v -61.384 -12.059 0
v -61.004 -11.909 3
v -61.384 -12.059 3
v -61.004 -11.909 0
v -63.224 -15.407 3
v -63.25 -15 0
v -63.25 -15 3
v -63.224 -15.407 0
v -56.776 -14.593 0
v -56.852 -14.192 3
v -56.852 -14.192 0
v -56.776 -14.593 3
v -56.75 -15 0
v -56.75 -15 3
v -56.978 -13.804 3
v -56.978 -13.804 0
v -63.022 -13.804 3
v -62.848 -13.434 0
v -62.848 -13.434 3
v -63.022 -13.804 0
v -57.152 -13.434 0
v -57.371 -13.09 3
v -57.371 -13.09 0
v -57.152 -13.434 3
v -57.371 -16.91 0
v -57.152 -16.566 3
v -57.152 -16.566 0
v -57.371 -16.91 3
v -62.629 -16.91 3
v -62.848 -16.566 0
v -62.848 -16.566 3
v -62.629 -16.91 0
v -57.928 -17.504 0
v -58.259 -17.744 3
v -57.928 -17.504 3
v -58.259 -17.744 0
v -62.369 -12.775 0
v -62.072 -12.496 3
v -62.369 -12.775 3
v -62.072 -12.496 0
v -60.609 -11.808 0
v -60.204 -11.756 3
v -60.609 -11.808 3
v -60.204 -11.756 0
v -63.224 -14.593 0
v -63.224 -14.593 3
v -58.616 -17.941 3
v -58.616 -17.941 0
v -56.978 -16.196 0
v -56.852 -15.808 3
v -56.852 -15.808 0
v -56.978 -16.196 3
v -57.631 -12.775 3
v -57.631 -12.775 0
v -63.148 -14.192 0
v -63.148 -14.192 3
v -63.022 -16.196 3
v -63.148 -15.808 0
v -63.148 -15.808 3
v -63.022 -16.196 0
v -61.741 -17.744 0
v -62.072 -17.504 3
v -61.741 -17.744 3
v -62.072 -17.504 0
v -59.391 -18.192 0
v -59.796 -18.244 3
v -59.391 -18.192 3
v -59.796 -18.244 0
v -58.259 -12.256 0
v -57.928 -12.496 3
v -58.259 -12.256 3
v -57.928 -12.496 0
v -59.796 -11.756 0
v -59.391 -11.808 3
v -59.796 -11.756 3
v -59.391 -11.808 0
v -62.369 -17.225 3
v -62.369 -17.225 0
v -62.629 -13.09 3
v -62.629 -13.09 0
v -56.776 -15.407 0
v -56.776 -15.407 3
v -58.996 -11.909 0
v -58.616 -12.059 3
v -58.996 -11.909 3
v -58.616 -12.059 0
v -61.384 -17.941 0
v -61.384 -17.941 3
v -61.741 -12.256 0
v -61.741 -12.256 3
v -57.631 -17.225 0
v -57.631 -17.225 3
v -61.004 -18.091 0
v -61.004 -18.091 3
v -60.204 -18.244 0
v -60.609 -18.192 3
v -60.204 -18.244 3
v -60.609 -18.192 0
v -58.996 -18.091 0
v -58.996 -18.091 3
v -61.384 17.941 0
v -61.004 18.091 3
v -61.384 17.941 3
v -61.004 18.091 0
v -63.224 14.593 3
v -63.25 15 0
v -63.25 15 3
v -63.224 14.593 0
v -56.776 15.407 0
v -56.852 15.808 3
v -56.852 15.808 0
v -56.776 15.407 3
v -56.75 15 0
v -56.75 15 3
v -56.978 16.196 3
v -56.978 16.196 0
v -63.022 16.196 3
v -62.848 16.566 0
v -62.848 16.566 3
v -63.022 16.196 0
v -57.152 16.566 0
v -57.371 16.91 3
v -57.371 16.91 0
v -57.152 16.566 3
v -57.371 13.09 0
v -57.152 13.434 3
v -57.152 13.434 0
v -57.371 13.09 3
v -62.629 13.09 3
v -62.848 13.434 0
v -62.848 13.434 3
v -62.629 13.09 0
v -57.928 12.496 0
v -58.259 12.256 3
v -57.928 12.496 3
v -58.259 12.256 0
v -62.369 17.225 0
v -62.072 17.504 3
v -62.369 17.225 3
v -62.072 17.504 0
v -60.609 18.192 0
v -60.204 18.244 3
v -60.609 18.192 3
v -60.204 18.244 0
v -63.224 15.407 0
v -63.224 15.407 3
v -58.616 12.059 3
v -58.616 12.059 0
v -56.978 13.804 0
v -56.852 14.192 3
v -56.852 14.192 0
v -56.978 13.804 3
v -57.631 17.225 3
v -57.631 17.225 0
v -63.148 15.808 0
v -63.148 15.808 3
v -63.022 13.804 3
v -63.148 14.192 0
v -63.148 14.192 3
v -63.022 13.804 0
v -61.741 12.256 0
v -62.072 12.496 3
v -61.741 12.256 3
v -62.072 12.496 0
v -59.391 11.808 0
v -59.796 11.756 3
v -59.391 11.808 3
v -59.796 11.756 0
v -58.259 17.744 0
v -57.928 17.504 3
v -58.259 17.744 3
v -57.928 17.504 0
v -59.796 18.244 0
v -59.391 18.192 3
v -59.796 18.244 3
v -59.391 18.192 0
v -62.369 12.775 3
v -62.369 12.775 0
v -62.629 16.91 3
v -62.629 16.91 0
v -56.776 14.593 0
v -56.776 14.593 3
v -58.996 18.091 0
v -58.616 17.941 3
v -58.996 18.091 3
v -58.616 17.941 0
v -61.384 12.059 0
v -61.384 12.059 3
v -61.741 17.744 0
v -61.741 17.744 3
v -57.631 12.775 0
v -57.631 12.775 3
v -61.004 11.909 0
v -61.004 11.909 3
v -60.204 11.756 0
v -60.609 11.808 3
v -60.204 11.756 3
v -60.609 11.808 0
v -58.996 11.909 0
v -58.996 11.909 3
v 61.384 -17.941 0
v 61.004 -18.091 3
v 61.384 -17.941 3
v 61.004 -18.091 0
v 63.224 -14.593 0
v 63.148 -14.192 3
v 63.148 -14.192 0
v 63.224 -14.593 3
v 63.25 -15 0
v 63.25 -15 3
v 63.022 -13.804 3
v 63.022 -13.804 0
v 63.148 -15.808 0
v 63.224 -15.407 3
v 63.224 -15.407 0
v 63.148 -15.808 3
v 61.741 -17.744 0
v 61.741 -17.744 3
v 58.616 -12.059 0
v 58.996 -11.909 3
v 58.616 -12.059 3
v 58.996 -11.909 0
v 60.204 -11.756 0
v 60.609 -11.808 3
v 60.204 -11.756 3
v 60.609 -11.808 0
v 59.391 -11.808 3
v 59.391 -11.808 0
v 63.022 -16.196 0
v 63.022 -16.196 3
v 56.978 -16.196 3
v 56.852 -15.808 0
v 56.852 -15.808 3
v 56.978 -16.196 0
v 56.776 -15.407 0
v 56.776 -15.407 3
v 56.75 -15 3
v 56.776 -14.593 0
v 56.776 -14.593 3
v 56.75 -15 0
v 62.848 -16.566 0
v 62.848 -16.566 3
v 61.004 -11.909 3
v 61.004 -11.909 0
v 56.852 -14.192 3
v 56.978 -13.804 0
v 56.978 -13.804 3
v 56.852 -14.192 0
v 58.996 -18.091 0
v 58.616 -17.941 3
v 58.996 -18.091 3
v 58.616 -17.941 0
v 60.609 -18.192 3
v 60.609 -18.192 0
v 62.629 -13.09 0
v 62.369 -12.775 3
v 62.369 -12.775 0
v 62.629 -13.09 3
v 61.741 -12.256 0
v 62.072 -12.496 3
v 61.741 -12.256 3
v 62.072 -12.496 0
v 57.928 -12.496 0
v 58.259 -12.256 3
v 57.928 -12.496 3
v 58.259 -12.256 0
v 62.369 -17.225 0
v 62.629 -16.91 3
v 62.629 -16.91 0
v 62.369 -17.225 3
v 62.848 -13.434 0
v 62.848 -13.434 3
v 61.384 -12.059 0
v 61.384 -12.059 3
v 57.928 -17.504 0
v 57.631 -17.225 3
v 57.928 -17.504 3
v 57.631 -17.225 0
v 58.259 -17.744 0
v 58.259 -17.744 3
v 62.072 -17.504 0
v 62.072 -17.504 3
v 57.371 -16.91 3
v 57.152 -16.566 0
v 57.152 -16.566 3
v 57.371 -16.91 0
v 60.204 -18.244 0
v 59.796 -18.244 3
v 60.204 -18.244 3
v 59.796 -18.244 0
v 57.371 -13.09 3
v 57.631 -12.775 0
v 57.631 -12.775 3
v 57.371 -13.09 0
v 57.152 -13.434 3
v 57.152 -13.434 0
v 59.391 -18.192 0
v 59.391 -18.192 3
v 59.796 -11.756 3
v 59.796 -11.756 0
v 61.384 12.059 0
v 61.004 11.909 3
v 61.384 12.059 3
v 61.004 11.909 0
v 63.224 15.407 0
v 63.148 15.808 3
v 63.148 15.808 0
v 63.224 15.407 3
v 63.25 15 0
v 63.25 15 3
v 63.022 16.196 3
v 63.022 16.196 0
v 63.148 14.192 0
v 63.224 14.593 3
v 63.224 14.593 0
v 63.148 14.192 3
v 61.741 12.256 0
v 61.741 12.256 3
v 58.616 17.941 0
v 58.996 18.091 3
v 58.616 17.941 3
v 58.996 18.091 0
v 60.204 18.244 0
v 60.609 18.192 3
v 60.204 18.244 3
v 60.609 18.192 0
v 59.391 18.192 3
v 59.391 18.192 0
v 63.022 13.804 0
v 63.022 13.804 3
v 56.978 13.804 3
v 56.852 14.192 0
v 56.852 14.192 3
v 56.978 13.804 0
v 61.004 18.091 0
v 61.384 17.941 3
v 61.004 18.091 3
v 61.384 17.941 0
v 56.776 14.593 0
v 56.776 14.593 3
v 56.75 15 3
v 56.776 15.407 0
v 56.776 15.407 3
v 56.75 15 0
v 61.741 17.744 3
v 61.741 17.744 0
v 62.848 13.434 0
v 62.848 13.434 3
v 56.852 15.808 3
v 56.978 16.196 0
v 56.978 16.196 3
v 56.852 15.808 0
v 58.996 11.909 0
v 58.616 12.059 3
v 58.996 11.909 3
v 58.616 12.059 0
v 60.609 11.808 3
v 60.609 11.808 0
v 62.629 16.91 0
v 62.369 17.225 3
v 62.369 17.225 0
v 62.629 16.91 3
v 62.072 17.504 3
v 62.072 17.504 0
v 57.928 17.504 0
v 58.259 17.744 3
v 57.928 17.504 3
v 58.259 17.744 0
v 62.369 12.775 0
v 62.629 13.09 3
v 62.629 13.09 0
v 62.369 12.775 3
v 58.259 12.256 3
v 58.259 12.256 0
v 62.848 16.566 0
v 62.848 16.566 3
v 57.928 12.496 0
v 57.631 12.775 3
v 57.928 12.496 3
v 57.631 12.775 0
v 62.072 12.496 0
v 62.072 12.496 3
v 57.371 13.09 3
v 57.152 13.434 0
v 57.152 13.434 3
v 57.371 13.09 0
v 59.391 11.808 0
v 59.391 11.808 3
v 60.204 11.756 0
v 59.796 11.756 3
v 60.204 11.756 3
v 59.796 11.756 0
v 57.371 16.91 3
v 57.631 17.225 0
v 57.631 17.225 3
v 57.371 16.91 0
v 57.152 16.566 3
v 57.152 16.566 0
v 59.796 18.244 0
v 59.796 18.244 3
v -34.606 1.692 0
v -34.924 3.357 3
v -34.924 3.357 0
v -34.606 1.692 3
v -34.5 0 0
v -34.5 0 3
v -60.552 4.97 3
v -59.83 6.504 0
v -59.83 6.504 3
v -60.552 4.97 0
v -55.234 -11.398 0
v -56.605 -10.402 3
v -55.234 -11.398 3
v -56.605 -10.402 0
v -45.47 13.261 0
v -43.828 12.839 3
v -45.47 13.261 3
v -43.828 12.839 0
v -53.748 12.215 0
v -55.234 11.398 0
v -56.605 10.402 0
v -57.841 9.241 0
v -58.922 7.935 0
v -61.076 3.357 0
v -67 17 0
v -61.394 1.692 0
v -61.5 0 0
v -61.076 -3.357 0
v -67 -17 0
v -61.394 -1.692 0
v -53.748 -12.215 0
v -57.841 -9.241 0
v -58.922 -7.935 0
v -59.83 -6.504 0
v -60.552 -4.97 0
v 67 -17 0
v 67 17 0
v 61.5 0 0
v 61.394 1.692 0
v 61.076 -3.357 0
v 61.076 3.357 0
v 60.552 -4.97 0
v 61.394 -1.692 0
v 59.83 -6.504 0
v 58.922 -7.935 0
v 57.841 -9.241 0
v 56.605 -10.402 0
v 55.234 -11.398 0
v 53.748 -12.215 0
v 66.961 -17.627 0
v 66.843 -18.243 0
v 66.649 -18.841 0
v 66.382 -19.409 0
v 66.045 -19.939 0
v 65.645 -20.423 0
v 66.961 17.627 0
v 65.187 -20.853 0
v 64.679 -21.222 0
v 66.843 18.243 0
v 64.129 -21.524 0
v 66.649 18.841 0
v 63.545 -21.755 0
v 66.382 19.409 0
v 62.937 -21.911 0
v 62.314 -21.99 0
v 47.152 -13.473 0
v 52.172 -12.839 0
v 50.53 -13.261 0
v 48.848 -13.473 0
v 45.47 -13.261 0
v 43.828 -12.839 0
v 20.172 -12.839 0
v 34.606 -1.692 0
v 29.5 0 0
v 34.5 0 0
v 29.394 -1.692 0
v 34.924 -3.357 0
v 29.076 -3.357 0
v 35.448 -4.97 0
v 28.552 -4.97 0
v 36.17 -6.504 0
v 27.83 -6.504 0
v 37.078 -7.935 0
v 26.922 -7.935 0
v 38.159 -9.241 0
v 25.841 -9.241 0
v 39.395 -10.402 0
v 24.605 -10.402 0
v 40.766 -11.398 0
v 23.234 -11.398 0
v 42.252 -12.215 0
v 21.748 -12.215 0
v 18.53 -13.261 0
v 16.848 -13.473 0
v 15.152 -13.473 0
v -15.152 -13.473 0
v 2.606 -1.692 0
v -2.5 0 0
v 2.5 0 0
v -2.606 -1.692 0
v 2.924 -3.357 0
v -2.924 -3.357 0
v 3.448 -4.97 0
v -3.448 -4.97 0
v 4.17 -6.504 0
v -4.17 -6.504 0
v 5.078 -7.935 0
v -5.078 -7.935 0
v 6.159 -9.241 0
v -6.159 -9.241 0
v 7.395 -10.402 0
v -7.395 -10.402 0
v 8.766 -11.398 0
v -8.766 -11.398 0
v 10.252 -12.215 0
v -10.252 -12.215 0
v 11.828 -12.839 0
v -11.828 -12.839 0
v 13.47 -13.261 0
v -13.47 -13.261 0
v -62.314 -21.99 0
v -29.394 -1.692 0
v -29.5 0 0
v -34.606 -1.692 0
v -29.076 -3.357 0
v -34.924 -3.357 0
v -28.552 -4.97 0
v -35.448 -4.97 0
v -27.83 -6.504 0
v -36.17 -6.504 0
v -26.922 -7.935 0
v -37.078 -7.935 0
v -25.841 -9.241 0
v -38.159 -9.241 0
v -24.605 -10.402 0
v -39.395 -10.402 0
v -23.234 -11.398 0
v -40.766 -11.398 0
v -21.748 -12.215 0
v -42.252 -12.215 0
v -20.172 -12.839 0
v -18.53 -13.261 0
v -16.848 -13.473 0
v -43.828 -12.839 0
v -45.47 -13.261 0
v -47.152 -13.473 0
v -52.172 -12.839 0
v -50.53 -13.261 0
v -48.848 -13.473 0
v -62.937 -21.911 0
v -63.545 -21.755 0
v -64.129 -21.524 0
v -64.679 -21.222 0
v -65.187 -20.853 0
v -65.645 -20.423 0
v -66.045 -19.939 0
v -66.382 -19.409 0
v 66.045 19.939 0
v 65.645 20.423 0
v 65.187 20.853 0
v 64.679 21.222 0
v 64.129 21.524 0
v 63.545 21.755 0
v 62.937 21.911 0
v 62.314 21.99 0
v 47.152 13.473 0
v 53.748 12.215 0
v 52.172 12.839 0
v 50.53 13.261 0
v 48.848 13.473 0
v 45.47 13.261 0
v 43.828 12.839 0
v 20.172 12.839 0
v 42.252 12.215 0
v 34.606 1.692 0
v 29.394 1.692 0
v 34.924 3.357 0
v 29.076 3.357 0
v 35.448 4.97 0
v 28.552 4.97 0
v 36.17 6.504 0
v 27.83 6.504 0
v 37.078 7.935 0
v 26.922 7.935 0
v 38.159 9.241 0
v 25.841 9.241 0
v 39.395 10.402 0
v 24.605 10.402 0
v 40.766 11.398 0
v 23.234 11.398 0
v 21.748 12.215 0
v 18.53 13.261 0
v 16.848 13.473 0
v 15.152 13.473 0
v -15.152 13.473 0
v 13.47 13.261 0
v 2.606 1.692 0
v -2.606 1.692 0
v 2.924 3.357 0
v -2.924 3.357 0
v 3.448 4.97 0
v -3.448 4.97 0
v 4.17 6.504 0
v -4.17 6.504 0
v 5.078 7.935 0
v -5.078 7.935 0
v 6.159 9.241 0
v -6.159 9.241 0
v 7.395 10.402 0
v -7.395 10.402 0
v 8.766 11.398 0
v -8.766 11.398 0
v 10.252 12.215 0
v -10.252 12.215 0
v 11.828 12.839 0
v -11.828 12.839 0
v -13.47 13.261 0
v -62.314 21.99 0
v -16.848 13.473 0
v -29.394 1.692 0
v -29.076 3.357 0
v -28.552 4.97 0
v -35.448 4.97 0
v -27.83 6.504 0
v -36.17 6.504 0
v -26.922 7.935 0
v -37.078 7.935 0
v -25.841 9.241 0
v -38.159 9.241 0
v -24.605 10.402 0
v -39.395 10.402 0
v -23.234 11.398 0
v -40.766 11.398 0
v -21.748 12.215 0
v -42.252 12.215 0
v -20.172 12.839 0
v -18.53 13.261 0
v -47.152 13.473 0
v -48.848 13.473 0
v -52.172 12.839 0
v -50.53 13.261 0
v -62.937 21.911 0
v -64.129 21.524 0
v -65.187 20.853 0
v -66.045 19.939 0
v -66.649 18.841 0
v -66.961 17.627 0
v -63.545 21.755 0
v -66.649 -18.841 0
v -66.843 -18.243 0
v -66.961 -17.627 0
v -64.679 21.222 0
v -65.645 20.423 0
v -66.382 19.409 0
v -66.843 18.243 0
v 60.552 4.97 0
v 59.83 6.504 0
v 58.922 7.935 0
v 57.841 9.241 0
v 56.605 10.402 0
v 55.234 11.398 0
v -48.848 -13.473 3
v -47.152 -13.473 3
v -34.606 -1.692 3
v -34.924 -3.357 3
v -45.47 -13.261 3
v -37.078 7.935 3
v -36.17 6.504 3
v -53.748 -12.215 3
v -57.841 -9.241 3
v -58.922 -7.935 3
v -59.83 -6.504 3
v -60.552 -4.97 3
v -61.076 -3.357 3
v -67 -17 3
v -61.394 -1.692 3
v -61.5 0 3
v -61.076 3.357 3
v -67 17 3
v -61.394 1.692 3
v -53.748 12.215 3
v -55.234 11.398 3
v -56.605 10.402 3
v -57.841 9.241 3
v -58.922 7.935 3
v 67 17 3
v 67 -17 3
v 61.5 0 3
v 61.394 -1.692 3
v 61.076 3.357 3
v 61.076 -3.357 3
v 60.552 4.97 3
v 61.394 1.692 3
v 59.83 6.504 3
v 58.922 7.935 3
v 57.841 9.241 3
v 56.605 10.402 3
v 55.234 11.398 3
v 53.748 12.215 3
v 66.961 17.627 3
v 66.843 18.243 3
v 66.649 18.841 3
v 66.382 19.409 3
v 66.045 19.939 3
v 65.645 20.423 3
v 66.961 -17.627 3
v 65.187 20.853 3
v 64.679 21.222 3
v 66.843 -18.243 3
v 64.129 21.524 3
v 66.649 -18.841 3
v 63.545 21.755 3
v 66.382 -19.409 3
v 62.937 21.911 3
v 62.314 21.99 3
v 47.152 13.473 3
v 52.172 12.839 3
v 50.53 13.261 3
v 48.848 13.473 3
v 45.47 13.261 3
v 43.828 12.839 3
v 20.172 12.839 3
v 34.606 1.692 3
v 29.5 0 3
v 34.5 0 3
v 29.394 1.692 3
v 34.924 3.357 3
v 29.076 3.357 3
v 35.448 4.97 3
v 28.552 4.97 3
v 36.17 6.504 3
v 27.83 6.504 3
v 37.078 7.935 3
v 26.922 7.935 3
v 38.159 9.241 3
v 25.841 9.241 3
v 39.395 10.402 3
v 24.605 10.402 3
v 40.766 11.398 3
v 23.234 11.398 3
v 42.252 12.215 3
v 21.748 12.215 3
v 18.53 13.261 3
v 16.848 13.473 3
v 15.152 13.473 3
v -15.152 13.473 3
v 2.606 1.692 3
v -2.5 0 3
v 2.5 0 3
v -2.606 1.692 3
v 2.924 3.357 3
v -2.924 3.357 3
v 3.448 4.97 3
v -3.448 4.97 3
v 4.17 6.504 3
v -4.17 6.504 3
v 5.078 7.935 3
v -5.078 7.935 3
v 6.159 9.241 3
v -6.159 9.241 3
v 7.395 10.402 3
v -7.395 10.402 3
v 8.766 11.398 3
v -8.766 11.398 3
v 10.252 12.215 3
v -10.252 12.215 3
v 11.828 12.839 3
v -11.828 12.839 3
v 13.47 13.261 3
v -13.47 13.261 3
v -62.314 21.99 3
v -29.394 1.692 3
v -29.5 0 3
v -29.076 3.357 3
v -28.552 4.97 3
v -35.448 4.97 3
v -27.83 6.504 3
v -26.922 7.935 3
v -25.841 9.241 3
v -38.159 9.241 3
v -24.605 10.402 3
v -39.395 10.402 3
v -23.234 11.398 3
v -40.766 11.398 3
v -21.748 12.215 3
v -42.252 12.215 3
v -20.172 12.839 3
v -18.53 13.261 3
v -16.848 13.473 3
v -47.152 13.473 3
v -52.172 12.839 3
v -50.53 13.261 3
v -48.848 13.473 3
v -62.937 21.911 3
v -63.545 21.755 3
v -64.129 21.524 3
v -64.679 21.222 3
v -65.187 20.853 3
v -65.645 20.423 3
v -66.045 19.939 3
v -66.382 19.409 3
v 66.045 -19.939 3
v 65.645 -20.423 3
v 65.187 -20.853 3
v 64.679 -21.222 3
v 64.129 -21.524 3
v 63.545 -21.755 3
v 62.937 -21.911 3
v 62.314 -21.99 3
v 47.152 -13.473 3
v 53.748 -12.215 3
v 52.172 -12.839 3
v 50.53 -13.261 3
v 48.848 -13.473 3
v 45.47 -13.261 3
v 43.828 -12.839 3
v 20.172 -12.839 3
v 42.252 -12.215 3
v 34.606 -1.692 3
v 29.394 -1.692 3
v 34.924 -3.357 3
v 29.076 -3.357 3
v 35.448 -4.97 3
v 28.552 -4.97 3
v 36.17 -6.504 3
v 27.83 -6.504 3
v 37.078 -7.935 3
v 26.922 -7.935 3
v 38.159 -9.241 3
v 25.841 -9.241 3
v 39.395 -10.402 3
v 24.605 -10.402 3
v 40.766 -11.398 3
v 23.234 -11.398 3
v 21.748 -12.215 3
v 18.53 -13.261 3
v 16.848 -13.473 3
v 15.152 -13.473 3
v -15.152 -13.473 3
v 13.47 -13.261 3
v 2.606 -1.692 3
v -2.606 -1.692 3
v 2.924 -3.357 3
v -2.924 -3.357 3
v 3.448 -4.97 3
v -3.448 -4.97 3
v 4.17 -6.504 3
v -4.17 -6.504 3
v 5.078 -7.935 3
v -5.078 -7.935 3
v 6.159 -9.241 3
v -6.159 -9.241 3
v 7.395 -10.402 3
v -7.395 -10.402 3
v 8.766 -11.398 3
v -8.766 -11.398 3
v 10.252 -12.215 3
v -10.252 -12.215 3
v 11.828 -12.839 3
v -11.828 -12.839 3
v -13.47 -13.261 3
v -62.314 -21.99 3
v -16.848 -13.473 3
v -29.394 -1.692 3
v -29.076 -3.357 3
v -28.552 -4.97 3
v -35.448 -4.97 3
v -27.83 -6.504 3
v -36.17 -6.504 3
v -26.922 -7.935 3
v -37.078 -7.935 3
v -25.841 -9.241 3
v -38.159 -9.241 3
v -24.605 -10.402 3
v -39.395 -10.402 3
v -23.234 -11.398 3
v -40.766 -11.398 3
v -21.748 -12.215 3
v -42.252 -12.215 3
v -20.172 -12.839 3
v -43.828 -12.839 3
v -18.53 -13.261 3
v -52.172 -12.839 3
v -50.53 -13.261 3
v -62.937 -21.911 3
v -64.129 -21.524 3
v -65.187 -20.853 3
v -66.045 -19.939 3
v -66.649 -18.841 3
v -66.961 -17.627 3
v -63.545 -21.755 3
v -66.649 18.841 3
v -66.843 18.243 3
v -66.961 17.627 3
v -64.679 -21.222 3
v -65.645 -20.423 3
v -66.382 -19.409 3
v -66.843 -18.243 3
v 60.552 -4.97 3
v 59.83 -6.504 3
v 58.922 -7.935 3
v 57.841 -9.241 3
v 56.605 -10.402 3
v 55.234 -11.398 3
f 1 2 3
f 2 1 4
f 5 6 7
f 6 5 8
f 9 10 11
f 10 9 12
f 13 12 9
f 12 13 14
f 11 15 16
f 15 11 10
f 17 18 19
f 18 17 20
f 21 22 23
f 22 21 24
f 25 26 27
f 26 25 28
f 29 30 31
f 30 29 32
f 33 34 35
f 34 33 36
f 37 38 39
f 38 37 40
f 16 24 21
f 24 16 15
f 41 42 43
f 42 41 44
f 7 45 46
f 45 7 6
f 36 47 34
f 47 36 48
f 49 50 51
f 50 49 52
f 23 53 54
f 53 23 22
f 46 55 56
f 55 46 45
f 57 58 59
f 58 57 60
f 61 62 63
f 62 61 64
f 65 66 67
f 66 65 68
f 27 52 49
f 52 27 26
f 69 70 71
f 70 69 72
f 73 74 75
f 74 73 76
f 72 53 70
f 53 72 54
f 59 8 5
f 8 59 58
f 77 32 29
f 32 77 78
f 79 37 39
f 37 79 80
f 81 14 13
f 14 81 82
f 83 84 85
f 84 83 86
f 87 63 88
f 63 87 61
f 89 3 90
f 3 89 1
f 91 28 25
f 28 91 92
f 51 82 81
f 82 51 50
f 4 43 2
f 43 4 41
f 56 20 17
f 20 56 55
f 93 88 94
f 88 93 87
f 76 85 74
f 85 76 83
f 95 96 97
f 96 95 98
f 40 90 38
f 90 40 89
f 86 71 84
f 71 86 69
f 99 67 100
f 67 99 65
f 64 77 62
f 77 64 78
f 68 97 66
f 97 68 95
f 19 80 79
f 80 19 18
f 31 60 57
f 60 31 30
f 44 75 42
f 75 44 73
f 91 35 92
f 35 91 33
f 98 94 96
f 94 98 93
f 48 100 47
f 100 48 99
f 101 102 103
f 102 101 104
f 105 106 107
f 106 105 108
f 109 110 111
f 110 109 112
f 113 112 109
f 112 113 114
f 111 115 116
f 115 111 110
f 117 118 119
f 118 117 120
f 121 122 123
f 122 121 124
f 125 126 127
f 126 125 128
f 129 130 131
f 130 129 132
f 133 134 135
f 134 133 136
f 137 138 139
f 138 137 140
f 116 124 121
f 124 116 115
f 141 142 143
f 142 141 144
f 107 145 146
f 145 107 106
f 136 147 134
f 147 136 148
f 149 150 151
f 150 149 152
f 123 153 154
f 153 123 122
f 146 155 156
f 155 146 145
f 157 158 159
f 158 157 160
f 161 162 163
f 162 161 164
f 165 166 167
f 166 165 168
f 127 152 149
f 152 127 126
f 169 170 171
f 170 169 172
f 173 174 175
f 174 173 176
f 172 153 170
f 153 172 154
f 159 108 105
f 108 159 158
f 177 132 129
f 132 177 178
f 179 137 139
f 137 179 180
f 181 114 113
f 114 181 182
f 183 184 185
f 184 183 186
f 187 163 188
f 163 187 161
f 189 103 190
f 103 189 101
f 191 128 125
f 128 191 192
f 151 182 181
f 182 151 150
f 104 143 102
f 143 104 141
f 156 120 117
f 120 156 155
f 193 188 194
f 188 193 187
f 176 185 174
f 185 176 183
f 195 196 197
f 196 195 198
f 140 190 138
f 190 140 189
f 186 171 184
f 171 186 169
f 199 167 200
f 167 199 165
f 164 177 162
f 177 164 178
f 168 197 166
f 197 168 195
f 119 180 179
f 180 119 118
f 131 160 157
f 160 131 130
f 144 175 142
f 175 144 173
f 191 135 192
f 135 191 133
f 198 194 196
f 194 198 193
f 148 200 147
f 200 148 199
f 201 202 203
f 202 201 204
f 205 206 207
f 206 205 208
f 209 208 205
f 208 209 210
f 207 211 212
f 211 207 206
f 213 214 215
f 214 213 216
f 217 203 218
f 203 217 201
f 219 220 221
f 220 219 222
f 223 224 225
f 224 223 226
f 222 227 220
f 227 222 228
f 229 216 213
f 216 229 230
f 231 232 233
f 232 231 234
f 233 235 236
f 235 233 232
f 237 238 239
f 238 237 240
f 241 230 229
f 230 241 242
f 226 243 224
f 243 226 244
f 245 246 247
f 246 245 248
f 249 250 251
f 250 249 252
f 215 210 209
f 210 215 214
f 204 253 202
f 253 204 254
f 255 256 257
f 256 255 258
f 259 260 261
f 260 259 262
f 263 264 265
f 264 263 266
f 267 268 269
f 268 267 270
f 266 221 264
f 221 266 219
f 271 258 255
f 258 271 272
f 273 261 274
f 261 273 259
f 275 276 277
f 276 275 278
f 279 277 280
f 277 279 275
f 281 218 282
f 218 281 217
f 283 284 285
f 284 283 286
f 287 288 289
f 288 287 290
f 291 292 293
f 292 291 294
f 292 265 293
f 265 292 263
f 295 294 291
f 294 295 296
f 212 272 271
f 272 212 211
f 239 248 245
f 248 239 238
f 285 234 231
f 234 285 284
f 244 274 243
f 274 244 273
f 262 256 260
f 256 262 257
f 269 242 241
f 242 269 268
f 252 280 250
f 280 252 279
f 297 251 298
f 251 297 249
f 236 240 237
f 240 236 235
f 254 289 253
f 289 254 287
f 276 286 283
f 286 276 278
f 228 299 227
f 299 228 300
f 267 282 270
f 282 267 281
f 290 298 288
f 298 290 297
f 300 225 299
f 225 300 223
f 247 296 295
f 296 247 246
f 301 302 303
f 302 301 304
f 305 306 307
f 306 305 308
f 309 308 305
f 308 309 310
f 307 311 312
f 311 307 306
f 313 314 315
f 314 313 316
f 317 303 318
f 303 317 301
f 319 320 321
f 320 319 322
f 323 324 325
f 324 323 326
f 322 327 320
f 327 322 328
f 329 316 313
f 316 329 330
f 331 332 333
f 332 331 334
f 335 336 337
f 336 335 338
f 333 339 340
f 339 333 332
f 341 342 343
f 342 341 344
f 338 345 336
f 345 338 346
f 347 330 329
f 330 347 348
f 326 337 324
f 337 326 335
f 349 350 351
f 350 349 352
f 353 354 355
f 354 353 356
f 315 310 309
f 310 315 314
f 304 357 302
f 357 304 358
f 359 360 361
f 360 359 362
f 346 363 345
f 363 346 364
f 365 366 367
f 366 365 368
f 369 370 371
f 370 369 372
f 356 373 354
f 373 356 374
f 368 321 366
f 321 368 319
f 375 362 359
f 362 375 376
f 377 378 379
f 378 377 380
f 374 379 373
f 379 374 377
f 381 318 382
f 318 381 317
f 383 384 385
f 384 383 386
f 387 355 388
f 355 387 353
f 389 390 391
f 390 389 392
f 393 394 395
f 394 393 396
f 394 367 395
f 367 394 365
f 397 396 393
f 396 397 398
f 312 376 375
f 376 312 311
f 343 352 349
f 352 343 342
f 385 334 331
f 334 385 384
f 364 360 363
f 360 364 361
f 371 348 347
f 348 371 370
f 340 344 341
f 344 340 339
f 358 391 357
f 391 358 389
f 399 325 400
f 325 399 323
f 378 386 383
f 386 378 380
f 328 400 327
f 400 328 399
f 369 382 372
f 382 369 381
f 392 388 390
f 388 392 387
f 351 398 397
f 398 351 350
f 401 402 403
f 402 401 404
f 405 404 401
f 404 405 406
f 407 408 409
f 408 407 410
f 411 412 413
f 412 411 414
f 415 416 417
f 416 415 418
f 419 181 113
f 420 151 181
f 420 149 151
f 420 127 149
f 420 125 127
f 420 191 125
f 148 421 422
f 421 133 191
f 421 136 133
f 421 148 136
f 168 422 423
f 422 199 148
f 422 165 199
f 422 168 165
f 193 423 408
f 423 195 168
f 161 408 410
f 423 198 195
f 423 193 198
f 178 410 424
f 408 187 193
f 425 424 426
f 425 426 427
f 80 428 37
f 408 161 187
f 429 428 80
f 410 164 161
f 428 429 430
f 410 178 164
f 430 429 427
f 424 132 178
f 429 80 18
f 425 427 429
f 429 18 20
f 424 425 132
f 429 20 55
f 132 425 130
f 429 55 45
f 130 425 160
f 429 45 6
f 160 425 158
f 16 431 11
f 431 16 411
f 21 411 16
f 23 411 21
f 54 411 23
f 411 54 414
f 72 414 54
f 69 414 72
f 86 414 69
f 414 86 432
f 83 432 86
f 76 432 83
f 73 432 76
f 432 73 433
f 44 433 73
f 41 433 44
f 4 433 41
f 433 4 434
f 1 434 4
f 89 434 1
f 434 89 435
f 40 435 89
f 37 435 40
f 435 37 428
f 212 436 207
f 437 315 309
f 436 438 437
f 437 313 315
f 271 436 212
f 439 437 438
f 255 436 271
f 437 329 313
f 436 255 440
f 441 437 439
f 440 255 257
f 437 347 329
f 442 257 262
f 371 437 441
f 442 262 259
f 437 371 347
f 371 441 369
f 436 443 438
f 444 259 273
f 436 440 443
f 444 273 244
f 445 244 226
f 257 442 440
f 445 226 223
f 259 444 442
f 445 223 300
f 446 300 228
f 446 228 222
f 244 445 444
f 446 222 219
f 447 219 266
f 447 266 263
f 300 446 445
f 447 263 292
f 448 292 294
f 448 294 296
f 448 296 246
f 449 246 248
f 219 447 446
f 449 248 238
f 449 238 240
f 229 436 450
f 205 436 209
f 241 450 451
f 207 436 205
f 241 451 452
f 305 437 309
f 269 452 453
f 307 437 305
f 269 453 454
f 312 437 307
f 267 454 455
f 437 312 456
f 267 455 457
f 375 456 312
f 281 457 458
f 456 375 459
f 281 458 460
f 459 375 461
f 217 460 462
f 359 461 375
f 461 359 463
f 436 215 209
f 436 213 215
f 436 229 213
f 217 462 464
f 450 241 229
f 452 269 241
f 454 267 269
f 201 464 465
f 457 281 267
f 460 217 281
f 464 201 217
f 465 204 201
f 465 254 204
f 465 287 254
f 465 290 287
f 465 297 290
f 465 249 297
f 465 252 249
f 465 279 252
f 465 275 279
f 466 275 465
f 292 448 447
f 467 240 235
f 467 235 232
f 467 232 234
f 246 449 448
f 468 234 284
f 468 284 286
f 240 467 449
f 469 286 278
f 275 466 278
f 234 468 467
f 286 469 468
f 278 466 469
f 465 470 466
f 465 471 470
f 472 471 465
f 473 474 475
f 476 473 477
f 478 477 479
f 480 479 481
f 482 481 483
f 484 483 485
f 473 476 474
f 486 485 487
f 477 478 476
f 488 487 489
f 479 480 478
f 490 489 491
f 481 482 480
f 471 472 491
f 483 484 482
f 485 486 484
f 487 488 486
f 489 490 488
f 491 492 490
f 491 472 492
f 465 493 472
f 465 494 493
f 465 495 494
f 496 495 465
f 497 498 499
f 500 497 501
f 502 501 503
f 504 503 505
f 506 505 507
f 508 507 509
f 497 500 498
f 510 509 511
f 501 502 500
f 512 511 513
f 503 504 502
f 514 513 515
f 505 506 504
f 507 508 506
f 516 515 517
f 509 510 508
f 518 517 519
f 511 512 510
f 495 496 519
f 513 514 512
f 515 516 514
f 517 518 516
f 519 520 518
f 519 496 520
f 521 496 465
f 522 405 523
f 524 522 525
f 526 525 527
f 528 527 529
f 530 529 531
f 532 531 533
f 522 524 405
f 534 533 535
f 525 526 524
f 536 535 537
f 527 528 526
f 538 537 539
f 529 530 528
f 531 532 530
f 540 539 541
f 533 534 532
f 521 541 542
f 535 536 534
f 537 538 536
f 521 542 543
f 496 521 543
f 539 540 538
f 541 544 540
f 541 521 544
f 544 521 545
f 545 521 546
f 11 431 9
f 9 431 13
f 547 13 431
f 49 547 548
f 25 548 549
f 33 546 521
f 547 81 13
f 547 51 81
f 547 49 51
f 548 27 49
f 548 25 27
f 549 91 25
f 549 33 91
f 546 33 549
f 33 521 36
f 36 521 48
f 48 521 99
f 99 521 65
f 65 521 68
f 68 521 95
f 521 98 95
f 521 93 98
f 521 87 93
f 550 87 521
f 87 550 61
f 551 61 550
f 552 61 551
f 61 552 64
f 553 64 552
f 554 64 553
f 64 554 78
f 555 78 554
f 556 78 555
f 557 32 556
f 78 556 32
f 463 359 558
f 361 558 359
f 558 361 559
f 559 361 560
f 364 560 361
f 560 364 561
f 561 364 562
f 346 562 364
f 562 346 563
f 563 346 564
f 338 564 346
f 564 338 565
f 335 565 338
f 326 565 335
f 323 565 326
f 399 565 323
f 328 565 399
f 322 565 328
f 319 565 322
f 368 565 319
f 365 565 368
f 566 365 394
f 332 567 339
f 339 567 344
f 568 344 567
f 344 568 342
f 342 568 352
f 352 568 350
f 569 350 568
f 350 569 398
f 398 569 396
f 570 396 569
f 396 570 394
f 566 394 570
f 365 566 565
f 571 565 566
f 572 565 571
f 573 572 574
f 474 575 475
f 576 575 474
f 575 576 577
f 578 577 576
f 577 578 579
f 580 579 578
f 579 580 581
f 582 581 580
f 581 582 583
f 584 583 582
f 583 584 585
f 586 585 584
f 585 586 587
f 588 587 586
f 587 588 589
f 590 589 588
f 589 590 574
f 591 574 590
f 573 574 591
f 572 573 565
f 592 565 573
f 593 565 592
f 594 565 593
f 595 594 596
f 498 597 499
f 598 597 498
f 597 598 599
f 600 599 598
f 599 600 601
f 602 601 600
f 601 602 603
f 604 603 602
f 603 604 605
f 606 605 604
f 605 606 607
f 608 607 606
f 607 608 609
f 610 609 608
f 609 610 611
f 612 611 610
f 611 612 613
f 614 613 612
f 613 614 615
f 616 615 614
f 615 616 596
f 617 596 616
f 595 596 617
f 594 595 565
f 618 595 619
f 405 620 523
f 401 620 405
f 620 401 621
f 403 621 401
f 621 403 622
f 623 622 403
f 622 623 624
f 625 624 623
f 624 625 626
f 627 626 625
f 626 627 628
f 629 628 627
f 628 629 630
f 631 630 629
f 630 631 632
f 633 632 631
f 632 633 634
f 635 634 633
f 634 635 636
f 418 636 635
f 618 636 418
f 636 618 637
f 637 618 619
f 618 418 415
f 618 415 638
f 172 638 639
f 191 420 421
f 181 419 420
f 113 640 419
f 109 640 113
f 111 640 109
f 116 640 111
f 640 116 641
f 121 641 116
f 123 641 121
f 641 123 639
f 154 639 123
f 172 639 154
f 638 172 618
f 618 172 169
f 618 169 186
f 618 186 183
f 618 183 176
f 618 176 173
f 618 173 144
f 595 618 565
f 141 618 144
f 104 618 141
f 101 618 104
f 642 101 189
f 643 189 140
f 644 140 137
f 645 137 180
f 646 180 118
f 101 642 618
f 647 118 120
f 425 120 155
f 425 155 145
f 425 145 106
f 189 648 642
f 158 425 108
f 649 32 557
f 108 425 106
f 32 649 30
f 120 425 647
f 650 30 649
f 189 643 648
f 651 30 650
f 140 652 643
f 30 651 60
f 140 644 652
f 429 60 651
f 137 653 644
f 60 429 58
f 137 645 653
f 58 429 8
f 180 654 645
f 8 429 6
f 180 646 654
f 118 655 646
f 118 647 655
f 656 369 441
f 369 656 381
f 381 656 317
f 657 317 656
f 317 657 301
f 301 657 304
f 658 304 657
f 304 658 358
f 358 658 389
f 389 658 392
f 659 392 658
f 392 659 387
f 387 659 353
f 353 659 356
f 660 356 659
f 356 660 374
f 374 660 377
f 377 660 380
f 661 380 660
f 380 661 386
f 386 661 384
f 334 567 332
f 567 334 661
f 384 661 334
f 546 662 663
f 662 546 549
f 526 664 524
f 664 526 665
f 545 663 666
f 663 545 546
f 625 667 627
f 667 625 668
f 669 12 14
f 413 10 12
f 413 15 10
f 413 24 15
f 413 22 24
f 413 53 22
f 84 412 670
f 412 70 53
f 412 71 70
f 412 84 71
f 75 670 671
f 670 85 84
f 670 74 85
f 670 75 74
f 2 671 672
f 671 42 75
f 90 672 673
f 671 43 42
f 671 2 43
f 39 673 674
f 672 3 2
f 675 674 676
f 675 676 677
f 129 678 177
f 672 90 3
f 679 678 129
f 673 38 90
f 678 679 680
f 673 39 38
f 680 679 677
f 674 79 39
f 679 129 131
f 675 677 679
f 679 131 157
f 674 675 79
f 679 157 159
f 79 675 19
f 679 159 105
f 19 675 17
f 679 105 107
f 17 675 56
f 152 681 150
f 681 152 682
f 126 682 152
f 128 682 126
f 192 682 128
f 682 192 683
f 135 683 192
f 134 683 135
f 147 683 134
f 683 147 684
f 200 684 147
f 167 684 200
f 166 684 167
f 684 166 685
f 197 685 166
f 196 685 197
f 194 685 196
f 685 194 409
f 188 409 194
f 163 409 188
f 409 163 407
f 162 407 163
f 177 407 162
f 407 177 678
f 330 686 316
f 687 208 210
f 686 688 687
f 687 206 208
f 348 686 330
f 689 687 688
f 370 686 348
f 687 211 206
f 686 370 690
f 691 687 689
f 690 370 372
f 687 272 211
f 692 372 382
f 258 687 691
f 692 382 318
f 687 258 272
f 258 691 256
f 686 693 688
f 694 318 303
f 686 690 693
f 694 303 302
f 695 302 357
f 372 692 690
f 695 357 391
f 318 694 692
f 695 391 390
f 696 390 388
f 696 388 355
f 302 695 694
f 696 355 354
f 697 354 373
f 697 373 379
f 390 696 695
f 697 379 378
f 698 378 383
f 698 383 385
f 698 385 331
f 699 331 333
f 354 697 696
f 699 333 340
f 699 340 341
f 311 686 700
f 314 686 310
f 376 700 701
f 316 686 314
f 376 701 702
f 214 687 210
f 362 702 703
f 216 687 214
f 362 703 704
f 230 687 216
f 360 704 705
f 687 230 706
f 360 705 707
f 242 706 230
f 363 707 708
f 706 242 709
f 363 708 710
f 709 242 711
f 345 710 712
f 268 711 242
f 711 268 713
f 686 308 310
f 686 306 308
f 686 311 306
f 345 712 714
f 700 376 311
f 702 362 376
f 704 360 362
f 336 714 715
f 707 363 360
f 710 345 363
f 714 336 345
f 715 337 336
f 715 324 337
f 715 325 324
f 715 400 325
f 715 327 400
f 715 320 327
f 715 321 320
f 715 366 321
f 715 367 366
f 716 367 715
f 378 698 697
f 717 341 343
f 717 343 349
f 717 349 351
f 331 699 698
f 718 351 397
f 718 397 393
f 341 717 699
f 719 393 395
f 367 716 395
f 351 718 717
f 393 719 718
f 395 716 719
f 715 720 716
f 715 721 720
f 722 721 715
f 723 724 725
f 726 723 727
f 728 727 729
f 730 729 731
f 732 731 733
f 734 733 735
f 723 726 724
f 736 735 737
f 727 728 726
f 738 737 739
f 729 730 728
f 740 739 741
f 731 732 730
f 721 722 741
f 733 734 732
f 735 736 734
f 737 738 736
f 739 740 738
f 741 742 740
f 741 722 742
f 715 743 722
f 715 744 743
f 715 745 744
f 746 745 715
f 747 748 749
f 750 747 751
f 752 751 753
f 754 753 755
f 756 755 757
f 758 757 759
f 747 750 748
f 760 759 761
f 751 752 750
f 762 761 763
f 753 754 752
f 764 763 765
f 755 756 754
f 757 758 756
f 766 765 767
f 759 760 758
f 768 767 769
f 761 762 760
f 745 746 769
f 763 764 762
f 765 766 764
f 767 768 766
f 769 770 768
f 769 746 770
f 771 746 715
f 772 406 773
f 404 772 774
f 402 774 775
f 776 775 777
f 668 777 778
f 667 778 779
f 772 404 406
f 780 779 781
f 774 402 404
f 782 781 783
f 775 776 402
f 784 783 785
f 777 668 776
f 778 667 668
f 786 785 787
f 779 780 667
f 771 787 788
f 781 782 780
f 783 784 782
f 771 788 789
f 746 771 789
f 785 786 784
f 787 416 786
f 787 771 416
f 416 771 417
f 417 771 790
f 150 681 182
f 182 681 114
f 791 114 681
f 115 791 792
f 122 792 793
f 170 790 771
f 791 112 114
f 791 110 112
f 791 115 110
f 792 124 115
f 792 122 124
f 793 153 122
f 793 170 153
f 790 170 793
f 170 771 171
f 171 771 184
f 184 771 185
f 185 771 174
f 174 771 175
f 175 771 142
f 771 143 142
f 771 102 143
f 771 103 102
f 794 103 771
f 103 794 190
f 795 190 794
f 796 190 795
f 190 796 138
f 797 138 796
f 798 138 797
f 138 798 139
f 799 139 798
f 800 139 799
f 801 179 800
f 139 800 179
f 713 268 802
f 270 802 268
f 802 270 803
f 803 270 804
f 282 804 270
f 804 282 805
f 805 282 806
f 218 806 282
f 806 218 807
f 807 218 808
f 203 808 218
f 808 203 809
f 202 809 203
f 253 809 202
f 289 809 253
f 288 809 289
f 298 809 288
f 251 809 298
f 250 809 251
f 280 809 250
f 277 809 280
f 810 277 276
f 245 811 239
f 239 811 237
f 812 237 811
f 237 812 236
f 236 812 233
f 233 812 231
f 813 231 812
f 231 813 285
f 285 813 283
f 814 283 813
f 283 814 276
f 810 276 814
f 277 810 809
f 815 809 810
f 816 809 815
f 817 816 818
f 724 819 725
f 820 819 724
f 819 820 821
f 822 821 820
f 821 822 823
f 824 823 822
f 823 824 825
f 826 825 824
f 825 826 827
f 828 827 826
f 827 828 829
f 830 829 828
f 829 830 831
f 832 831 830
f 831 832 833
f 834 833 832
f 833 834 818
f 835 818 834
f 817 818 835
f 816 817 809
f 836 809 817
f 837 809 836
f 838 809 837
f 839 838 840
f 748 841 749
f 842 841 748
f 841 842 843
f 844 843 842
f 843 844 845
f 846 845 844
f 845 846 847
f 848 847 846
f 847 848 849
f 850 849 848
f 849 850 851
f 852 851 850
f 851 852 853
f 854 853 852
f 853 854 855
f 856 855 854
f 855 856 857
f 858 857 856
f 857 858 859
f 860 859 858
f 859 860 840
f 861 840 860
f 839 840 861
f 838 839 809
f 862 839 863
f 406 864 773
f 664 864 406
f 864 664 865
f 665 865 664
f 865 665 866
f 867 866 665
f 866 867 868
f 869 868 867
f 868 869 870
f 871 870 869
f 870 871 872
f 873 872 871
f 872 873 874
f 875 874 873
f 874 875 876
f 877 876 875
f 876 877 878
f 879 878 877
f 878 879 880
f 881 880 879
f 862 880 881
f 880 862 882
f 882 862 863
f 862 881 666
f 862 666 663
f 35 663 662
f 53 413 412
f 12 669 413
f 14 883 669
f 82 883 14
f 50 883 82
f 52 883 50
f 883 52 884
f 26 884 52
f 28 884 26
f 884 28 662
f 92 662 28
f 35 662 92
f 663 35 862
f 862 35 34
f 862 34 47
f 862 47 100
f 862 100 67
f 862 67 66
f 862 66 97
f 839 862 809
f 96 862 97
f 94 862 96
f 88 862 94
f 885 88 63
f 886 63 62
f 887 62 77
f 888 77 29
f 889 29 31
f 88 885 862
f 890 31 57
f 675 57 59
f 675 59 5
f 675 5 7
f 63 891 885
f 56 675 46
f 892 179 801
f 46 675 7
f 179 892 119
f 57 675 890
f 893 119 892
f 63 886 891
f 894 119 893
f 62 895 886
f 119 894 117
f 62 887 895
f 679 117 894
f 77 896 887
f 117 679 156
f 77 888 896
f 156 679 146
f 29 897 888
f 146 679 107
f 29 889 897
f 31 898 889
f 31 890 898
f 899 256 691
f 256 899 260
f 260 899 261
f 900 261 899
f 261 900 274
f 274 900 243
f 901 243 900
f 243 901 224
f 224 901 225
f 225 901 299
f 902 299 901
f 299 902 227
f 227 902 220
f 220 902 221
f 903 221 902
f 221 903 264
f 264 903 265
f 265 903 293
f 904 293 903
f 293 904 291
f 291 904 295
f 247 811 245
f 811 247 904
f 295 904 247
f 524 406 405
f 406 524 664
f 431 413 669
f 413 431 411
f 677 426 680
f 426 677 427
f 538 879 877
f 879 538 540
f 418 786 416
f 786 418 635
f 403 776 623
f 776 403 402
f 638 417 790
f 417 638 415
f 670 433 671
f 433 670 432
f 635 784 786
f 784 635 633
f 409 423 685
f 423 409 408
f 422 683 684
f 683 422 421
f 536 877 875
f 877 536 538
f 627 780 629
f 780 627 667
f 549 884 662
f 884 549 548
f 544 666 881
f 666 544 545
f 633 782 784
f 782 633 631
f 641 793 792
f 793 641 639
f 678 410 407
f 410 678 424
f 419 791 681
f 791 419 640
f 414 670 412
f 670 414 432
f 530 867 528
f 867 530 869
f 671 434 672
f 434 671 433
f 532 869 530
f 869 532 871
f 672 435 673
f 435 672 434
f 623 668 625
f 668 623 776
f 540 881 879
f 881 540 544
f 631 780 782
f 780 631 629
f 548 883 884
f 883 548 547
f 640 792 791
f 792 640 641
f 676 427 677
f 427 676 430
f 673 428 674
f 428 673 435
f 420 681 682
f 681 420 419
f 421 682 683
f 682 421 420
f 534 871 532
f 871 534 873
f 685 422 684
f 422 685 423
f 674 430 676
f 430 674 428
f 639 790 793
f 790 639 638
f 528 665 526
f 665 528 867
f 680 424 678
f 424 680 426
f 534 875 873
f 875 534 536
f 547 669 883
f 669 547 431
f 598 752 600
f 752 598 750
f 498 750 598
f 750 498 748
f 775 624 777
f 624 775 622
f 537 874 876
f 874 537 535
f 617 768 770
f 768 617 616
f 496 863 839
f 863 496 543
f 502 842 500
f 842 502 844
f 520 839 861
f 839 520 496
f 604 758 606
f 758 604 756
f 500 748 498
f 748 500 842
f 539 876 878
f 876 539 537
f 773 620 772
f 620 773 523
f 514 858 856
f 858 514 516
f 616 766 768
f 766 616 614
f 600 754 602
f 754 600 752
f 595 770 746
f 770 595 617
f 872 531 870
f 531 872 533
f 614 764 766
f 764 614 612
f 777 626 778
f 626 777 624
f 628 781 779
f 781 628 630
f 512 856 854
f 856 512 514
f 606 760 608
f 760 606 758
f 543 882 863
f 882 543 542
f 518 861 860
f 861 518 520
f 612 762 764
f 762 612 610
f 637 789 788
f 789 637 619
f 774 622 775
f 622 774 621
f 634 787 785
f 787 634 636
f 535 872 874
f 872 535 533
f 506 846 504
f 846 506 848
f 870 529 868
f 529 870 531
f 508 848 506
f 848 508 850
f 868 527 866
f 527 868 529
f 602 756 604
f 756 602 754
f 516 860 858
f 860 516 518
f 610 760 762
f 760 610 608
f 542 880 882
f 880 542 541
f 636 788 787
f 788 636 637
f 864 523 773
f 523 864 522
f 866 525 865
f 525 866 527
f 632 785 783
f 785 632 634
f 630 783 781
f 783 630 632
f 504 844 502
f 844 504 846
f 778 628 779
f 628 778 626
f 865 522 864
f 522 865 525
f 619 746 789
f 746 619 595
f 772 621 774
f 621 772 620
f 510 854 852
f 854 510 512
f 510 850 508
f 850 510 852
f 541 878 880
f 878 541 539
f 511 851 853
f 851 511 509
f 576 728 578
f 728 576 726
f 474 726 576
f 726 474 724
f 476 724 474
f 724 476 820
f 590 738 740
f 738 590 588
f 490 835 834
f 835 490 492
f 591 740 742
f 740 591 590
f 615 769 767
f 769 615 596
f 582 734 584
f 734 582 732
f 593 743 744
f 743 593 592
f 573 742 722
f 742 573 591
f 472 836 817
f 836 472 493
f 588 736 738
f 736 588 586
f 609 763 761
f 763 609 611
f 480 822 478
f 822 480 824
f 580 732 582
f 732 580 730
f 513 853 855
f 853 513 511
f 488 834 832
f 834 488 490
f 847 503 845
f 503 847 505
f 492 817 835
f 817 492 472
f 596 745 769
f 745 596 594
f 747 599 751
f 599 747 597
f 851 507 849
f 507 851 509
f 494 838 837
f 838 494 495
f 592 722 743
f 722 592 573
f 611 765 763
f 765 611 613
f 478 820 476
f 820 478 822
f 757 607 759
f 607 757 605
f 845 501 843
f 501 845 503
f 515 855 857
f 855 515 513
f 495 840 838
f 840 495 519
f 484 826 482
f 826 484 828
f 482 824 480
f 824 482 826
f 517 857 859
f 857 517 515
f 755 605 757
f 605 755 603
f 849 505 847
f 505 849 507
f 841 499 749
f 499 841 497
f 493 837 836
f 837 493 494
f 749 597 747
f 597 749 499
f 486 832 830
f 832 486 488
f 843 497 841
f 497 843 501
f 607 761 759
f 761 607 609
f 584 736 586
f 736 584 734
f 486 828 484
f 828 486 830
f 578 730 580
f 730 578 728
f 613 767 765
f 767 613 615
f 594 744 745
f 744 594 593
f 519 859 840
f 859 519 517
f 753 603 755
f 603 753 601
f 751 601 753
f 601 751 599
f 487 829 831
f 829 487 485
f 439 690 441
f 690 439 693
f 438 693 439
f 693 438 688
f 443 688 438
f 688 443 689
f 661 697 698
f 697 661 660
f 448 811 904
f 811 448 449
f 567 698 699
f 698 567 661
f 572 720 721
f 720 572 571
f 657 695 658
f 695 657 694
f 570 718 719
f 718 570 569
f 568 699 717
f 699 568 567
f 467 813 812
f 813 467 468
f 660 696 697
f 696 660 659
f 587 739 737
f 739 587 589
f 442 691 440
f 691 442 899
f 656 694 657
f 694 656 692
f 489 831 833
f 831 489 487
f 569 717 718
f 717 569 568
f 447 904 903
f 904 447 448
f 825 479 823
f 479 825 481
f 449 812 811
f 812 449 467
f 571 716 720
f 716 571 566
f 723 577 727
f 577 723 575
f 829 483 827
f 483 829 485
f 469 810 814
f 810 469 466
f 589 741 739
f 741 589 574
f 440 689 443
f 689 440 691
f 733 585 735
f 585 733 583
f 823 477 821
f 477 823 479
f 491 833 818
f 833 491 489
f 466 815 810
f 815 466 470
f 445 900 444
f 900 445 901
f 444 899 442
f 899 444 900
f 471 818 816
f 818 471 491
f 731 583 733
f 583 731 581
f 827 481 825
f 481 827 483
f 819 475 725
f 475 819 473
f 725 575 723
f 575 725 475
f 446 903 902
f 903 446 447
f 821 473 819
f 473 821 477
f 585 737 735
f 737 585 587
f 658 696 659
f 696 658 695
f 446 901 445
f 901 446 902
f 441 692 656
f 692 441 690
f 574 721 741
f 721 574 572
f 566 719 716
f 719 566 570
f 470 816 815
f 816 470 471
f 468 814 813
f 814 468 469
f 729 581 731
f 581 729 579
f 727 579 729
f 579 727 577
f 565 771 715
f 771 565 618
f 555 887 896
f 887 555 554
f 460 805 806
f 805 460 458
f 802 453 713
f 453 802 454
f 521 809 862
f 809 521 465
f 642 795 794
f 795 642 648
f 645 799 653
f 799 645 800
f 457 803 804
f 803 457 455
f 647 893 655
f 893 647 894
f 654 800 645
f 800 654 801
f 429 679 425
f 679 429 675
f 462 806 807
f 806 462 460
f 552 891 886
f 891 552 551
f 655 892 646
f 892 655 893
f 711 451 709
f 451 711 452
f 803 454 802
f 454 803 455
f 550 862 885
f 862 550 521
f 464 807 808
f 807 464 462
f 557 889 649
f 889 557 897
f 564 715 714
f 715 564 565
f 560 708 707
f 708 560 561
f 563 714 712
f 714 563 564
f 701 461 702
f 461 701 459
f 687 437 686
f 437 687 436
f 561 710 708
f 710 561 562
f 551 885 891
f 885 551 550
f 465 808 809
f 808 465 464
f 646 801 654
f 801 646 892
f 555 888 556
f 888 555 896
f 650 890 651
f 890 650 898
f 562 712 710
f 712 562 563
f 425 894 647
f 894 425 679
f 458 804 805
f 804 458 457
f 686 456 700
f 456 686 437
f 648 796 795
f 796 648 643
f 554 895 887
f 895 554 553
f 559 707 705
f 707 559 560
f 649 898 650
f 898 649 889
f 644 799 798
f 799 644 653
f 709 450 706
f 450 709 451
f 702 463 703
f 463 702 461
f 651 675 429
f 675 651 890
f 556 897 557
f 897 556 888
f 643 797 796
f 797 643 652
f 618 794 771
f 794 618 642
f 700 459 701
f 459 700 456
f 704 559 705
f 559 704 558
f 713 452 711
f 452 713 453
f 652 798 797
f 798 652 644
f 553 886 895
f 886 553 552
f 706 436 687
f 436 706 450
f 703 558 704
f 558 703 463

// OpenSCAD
$fn = 50;

difference() {
	union() {
		hull() {
			translate(v = [-62.0, 17.0, 0]) {
				cylinder(h = 3, r = 5);
			}
			translate(v = [62.0, 17.0, 0]) {
				cylinder(h = 3, r = 5);
			}
			translate(v = [-62.0, -17.0, 0]) {
				cylinder(h = 3, r = 5);
			}
			translate(v = [62.0, -17.0, 0]) {
				cylinder(h = 3, r = 5);
			}
		}
	}
	union() {
		translate(v = [-60.0, -15.0, -100.0]) {
			cylinder(h = 200, r = 3.25);
		}
		translate(v = [-60.0, 15.0, -100.0]) {
			cylinder(h = 200, r = 3.25);
		}
		translate(v = [60.0, -15.0, -100.0]) {
			cylinder(h = 200, r = 3.25);
		}
		translate(v = [60.0, 15.0, -100.0]) {
			cylinder(h = 200, r = 3.25);
		}
		translate(v = [-60.0, -15.0, -100.0]) {
			cylinder(h = 200, r = 1.8);
		}
		translate(v = [-60.0, 15.0, -100.0]) {
			cylinder(h = 200, r = 1.8);
		}
		translate(v = [60.0, -15.0, -100.0]) {
			cylinder(h = 200, r = 1.8);
		}
		translate(v = [60.0, 15.0, -100.0]) {
			cylinder(h = 200, r = 1.8);
		}
		translate(v = [-48.0, 0, 0.0]) {
			cylinder(h = 3, r = 13.5);
		}
		translate(v = [-16.0, 0, 0.0]) {
			cylinder(h = 3, r = 13.5);
		}
		translate(v = [16.0, 0, 0.0]) {
			cylinder(h = 3, r = 13.5);
		}
		translate(v = [48.0, 0, 0.0]) {
			cylinder(h = 3, r = 13.5);
		}
	}
}
